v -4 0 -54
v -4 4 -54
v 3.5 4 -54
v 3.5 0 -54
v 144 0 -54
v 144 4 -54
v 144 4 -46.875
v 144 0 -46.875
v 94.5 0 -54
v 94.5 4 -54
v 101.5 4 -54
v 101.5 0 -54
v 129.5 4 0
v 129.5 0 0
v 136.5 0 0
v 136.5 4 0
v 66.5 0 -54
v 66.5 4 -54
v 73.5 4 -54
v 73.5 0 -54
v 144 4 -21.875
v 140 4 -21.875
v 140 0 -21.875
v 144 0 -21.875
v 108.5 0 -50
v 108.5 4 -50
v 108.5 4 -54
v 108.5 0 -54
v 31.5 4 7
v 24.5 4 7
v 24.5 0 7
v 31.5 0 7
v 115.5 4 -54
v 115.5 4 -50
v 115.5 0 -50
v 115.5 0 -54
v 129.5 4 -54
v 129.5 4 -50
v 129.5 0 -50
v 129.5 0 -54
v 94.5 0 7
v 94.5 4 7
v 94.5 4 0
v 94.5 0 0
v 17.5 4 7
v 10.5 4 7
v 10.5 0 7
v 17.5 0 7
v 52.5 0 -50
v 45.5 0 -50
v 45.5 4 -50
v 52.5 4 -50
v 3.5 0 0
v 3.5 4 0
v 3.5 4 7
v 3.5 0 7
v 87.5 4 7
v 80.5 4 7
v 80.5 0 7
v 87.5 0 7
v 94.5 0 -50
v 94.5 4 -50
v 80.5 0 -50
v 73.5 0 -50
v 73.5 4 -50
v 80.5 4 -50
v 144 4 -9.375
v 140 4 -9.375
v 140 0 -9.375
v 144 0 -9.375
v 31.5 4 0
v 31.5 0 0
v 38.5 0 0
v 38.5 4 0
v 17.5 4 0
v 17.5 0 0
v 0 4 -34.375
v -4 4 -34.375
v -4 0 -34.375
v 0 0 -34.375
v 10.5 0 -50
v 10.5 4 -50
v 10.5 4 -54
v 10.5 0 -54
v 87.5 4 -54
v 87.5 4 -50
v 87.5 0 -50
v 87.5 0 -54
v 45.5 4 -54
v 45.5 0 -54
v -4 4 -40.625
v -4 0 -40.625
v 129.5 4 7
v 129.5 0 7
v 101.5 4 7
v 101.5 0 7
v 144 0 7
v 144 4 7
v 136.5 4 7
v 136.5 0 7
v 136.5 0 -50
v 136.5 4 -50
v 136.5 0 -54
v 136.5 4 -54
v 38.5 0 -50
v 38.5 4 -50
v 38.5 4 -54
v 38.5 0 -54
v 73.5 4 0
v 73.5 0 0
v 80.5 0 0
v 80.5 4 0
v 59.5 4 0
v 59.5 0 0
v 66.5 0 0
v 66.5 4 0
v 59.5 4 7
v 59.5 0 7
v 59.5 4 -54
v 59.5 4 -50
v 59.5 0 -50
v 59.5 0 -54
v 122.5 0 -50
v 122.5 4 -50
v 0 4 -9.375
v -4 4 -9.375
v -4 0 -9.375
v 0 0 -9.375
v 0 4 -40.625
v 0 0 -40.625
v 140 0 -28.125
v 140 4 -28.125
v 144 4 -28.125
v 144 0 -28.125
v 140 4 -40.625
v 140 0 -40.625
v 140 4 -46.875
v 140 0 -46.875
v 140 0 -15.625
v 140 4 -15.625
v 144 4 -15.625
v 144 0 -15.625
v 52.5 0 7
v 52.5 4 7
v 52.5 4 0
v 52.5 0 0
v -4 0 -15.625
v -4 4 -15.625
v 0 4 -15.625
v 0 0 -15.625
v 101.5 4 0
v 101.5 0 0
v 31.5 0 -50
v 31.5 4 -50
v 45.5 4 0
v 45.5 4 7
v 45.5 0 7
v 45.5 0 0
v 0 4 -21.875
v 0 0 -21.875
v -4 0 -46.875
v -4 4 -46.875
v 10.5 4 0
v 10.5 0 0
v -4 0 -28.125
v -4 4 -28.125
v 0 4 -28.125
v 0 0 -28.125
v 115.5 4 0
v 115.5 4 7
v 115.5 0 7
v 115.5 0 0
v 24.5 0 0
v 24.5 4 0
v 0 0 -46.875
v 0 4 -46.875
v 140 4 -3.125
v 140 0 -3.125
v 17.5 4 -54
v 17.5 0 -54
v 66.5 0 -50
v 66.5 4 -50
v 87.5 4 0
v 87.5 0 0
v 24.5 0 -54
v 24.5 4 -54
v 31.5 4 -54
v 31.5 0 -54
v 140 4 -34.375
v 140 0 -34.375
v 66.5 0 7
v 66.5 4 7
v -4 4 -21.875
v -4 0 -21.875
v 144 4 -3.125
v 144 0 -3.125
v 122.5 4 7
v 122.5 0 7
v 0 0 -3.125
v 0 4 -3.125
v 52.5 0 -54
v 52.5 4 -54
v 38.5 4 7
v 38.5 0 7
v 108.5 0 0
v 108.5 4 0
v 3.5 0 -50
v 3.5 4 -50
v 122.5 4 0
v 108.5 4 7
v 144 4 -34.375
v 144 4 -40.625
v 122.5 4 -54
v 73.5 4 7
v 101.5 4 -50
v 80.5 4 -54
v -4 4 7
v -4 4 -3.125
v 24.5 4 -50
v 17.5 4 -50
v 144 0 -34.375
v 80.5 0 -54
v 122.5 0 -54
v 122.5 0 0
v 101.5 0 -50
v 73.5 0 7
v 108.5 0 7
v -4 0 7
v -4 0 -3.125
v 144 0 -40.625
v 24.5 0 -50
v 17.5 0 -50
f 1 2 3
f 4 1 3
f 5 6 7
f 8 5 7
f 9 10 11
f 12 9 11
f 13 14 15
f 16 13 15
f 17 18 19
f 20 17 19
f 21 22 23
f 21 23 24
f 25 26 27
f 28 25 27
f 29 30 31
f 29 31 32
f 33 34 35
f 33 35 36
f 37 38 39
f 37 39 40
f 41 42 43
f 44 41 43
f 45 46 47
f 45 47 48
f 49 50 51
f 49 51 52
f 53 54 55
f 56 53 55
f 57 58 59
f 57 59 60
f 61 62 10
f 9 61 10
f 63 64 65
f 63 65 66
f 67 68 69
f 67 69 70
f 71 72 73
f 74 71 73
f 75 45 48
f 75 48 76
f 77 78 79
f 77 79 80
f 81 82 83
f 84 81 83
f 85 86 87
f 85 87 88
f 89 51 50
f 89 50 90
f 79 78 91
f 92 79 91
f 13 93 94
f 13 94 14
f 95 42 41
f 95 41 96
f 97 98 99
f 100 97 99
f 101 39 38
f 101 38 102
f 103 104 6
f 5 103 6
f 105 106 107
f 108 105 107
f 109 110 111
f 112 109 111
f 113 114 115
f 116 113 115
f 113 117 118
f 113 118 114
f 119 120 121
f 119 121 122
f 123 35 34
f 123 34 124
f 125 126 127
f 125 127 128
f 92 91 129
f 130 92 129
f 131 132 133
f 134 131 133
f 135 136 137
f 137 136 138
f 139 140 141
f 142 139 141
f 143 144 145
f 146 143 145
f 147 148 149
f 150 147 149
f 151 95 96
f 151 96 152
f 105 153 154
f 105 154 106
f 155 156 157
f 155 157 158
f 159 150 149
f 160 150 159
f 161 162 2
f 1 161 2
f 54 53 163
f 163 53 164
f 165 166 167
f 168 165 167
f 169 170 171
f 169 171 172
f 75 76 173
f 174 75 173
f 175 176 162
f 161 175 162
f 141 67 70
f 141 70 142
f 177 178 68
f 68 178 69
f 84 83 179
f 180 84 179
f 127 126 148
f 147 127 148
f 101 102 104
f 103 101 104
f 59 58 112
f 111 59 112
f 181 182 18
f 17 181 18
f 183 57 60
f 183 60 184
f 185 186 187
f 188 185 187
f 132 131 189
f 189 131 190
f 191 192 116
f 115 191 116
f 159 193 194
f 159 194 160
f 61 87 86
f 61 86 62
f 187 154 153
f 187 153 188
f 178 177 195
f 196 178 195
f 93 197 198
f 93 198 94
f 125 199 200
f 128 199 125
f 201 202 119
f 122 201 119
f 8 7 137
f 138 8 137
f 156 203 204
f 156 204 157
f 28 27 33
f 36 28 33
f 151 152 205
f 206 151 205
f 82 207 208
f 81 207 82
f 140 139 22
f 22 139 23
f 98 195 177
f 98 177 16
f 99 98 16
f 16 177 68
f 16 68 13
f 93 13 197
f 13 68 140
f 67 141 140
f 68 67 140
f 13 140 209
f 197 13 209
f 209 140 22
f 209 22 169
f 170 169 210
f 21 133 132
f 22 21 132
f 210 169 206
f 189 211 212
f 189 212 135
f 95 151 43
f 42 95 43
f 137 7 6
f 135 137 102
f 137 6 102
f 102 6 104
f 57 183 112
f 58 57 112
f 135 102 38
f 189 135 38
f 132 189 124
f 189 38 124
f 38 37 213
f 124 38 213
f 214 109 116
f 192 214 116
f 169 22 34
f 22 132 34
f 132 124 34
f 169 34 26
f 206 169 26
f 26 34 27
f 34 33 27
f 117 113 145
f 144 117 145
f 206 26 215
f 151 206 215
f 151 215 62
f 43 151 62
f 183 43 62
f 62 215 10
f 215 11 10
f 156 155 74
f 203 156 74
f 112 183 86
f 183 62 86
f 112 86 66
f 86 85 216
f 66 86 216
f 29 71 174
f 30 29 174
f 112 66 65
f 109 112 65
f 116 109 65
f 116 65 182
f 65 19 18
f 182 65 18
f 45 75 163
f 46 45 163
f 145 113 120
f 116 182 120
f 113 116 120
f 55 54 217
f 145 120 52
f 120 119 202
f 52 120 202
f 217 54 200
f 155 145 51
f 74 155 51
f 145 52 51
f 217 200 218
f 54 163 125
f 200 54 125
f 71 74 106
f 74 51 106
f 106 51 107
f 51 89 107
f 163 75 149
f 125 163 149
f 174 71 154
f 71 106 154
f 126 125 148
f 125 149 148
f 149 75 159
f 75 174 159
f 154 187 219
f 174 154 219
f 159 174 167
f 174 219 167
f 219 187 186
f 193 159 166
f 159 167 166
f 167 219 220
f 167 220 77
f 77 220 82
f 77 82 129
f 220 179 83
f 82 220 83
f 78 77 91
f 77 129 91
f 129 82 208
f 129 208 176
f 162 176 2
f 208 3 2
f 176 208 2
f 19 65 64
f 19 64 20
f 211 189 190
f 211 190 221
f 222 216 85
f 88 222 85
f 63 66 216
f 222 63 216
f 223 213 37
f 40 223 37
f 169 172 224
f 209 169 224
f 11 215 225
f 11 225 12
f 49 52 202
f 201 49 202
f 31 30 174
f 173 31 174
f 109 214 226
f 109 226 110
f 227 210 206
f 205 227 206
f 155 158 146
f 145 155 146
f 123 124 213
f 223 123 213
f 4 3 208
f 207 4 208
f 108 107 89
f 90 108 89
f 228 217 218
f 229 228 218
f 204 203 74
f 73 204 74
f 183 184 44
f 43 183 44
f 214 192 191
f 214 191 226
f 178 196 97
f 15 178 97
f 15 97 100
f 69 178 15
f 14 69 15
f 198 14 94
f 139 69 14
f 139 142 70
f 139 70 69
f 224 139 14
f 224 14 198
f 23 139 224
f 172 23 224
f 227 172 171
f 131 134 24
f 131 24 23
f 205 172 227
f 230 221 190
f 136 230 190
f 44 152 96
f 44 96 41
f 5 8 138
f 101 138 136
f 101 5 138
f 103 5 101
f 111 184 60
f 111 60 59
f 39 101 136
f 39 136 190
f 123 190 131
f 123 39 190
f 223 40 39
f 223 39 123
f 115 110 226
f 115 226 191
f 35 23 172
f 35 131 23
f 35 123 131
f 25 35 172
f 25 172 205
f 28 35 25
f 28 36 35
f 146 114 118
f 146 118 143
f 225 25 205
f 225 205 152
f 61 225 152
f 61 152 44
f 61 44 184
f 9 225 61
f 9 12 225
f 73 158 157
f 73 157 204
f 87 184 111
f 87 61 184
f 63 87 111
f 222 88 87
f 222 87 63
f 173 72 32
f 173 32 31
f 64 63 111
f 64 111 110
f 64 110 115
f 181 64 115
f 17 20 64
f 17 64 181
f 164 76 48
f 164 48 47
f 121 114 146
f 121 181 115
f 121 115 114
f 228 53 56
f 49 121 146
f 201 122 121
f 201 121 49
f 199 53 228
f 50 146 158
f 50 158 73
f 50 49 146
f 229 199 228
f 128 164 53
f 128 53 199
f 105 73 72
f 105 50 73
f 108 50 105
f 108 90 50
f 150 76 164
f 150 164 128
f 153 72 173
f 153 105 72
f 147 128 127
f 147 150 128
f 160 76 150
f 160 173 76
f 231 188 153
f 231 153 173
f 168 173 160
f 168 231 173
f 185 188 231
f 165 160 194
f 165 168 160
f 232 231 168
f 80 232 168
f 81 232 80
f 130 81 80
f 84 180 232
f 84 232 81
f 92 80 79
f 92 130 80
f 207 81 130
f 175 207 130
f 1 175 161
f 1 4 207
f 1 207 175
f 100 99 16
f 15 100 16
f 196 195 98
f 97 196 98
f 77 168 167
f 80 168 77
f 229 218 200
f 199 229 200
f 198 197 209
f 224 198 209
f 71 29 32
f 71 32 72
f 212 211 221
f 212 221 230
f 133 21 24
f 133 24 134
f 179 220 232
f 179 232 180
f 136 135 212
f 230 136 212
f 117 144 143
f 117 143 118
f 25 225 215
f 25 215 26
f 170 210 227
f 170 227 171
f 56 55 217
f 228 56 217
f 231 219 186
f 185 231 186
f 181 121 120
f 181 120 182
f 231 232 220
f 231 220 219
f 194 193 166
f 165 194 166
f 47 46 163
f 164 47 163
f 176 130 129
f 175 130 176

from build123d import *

# Parameters (mm, degrees)
SCHIZZO1_W                   = 140
SCHIZZO1_H                   = 50
ESTRUSIONE_ESTRUSIONE1_DEPTH = 4
ESTRUSIONE_ESTRUSIONE2_DEPTH = 4
SCHIZZO3_W                   = 4
SCHIZZO3_H                   = 6.25
ESTRUSIONE_ESTRUSIONE3_DEPTH = 4
RIPETIZIONE_A_L1_COUNT       = 3
RIPETIZIONE_A_L1_PITCH       = 12.5
SCHIZZO4_W                   = 7
SCHIZZO4_H                   = 4
SCHIZZO4_H_2                 = 7
ESTRUSIONE_ESTRUSIONE4_DEPTH = 4
RIPETIZIONE_A_L2_COUNT       = 9
RIPETIZIONE_A_L2_PITCH       = 14


with BuildPart() as part:
    # Schizzo1 → Estrusione-Estrusione1 (new body)
    with BuildSketch(Plane(origin=(0, 0, 0), x_dir=(1, 0, 0), z_dir=(0, 1, 0))):
        with Locations((70, 25)):
            Rectangle(SCHIZZO1_W, SCHIZZO1_H)
    extrude(amount=ESTRUSIONE_ESTRUSIONE1_DEPTH)

    # Schizzo2 → Estrusione-Estrusione2 (add)
    with BuildSketch(Plane(origin=(0, 4, 0), x_dir=(1, 0, 0), z_dir=(0, 1, 0))):
        Polygon((0, 3.125), (0, 0), (3.5, 0), (3.5, -7), (-4, -7), (-4, 3.125), align=None)
        Polygon((0, 46.875), (-4, 46.875), (-4, 54), (3.5, 54), (3.5, 50), (0, 50), align=None)
        Polygon((136.5, 50), (136.5, 54), (144, 54), (144, 46.875), (140, 46.875), (140, 50), align=None)
        Polygon((140, 3.125), (144, 3.125), (144, -7), (136.5, -7), (136.5, 0), (140, 0), align=None)
    extrude(amount=-ESTRUSIONE_ESTRUSIONE2_DEPTH)

    # Schizzo3 → Estrusione-Estrusione3 (add)
    with BuildSketch(Plane(origin=(0, 4, 0), x_dir=(1, 0, 0), z_dir=(0, 1, 0))):
        with Locations((-2, 37.5)):
            Rectangle(SCHIZZO3_W, SCHIZZO3_H)
        with Locations((142, 37.5)):
            Rectangle(SCHIZZO3_W, SCHIZZO3_H)
    estrusione_estrusione3 = extrude(amount=-ESTRUSIONE_ESTRUSIONE3_DEPTH)

    # Ripetizione a L1: Estrusione-Estrusione3 ×3
    with Locations(*[(0, 0, i * RIPETIZIONE_A_L1_PITCH) for i in range(1, RIPETIZIONE_A_L1_COUNT)]):
        add(estrusione_estrusione3)

    # Schizzo4 → Estrusione-Estrusione4 (add)
    with BuildSketch(Plane(origin=(0, 4, 0), x_dir=(1, 0, 0), z_dir=(0, 1, 0))):
        with Locations((14, 52)):
            Rectangle(SCHIZZO4_W, SCHIZZO4_H)
        with Locations((14, -3.5)):
            Rectangle(SCHIZZO4_W, SCHIZZO4_H_2)
    estrusione_estrusione4 = extrude(amount=-ESTRUSIONE_ESTRUSIONE4_DEPTH)

    # Ripetizione a L2: Estrusione-Estrusione4 ×9
    with Locations(*[(i * RIPETIZIONE_A_L2_PITCH, 0, 0) for i in range(1, RIPETIZIONE_A_L2_COUNT)]):
        add(estrusione_estrusione4)


solid = part.part
